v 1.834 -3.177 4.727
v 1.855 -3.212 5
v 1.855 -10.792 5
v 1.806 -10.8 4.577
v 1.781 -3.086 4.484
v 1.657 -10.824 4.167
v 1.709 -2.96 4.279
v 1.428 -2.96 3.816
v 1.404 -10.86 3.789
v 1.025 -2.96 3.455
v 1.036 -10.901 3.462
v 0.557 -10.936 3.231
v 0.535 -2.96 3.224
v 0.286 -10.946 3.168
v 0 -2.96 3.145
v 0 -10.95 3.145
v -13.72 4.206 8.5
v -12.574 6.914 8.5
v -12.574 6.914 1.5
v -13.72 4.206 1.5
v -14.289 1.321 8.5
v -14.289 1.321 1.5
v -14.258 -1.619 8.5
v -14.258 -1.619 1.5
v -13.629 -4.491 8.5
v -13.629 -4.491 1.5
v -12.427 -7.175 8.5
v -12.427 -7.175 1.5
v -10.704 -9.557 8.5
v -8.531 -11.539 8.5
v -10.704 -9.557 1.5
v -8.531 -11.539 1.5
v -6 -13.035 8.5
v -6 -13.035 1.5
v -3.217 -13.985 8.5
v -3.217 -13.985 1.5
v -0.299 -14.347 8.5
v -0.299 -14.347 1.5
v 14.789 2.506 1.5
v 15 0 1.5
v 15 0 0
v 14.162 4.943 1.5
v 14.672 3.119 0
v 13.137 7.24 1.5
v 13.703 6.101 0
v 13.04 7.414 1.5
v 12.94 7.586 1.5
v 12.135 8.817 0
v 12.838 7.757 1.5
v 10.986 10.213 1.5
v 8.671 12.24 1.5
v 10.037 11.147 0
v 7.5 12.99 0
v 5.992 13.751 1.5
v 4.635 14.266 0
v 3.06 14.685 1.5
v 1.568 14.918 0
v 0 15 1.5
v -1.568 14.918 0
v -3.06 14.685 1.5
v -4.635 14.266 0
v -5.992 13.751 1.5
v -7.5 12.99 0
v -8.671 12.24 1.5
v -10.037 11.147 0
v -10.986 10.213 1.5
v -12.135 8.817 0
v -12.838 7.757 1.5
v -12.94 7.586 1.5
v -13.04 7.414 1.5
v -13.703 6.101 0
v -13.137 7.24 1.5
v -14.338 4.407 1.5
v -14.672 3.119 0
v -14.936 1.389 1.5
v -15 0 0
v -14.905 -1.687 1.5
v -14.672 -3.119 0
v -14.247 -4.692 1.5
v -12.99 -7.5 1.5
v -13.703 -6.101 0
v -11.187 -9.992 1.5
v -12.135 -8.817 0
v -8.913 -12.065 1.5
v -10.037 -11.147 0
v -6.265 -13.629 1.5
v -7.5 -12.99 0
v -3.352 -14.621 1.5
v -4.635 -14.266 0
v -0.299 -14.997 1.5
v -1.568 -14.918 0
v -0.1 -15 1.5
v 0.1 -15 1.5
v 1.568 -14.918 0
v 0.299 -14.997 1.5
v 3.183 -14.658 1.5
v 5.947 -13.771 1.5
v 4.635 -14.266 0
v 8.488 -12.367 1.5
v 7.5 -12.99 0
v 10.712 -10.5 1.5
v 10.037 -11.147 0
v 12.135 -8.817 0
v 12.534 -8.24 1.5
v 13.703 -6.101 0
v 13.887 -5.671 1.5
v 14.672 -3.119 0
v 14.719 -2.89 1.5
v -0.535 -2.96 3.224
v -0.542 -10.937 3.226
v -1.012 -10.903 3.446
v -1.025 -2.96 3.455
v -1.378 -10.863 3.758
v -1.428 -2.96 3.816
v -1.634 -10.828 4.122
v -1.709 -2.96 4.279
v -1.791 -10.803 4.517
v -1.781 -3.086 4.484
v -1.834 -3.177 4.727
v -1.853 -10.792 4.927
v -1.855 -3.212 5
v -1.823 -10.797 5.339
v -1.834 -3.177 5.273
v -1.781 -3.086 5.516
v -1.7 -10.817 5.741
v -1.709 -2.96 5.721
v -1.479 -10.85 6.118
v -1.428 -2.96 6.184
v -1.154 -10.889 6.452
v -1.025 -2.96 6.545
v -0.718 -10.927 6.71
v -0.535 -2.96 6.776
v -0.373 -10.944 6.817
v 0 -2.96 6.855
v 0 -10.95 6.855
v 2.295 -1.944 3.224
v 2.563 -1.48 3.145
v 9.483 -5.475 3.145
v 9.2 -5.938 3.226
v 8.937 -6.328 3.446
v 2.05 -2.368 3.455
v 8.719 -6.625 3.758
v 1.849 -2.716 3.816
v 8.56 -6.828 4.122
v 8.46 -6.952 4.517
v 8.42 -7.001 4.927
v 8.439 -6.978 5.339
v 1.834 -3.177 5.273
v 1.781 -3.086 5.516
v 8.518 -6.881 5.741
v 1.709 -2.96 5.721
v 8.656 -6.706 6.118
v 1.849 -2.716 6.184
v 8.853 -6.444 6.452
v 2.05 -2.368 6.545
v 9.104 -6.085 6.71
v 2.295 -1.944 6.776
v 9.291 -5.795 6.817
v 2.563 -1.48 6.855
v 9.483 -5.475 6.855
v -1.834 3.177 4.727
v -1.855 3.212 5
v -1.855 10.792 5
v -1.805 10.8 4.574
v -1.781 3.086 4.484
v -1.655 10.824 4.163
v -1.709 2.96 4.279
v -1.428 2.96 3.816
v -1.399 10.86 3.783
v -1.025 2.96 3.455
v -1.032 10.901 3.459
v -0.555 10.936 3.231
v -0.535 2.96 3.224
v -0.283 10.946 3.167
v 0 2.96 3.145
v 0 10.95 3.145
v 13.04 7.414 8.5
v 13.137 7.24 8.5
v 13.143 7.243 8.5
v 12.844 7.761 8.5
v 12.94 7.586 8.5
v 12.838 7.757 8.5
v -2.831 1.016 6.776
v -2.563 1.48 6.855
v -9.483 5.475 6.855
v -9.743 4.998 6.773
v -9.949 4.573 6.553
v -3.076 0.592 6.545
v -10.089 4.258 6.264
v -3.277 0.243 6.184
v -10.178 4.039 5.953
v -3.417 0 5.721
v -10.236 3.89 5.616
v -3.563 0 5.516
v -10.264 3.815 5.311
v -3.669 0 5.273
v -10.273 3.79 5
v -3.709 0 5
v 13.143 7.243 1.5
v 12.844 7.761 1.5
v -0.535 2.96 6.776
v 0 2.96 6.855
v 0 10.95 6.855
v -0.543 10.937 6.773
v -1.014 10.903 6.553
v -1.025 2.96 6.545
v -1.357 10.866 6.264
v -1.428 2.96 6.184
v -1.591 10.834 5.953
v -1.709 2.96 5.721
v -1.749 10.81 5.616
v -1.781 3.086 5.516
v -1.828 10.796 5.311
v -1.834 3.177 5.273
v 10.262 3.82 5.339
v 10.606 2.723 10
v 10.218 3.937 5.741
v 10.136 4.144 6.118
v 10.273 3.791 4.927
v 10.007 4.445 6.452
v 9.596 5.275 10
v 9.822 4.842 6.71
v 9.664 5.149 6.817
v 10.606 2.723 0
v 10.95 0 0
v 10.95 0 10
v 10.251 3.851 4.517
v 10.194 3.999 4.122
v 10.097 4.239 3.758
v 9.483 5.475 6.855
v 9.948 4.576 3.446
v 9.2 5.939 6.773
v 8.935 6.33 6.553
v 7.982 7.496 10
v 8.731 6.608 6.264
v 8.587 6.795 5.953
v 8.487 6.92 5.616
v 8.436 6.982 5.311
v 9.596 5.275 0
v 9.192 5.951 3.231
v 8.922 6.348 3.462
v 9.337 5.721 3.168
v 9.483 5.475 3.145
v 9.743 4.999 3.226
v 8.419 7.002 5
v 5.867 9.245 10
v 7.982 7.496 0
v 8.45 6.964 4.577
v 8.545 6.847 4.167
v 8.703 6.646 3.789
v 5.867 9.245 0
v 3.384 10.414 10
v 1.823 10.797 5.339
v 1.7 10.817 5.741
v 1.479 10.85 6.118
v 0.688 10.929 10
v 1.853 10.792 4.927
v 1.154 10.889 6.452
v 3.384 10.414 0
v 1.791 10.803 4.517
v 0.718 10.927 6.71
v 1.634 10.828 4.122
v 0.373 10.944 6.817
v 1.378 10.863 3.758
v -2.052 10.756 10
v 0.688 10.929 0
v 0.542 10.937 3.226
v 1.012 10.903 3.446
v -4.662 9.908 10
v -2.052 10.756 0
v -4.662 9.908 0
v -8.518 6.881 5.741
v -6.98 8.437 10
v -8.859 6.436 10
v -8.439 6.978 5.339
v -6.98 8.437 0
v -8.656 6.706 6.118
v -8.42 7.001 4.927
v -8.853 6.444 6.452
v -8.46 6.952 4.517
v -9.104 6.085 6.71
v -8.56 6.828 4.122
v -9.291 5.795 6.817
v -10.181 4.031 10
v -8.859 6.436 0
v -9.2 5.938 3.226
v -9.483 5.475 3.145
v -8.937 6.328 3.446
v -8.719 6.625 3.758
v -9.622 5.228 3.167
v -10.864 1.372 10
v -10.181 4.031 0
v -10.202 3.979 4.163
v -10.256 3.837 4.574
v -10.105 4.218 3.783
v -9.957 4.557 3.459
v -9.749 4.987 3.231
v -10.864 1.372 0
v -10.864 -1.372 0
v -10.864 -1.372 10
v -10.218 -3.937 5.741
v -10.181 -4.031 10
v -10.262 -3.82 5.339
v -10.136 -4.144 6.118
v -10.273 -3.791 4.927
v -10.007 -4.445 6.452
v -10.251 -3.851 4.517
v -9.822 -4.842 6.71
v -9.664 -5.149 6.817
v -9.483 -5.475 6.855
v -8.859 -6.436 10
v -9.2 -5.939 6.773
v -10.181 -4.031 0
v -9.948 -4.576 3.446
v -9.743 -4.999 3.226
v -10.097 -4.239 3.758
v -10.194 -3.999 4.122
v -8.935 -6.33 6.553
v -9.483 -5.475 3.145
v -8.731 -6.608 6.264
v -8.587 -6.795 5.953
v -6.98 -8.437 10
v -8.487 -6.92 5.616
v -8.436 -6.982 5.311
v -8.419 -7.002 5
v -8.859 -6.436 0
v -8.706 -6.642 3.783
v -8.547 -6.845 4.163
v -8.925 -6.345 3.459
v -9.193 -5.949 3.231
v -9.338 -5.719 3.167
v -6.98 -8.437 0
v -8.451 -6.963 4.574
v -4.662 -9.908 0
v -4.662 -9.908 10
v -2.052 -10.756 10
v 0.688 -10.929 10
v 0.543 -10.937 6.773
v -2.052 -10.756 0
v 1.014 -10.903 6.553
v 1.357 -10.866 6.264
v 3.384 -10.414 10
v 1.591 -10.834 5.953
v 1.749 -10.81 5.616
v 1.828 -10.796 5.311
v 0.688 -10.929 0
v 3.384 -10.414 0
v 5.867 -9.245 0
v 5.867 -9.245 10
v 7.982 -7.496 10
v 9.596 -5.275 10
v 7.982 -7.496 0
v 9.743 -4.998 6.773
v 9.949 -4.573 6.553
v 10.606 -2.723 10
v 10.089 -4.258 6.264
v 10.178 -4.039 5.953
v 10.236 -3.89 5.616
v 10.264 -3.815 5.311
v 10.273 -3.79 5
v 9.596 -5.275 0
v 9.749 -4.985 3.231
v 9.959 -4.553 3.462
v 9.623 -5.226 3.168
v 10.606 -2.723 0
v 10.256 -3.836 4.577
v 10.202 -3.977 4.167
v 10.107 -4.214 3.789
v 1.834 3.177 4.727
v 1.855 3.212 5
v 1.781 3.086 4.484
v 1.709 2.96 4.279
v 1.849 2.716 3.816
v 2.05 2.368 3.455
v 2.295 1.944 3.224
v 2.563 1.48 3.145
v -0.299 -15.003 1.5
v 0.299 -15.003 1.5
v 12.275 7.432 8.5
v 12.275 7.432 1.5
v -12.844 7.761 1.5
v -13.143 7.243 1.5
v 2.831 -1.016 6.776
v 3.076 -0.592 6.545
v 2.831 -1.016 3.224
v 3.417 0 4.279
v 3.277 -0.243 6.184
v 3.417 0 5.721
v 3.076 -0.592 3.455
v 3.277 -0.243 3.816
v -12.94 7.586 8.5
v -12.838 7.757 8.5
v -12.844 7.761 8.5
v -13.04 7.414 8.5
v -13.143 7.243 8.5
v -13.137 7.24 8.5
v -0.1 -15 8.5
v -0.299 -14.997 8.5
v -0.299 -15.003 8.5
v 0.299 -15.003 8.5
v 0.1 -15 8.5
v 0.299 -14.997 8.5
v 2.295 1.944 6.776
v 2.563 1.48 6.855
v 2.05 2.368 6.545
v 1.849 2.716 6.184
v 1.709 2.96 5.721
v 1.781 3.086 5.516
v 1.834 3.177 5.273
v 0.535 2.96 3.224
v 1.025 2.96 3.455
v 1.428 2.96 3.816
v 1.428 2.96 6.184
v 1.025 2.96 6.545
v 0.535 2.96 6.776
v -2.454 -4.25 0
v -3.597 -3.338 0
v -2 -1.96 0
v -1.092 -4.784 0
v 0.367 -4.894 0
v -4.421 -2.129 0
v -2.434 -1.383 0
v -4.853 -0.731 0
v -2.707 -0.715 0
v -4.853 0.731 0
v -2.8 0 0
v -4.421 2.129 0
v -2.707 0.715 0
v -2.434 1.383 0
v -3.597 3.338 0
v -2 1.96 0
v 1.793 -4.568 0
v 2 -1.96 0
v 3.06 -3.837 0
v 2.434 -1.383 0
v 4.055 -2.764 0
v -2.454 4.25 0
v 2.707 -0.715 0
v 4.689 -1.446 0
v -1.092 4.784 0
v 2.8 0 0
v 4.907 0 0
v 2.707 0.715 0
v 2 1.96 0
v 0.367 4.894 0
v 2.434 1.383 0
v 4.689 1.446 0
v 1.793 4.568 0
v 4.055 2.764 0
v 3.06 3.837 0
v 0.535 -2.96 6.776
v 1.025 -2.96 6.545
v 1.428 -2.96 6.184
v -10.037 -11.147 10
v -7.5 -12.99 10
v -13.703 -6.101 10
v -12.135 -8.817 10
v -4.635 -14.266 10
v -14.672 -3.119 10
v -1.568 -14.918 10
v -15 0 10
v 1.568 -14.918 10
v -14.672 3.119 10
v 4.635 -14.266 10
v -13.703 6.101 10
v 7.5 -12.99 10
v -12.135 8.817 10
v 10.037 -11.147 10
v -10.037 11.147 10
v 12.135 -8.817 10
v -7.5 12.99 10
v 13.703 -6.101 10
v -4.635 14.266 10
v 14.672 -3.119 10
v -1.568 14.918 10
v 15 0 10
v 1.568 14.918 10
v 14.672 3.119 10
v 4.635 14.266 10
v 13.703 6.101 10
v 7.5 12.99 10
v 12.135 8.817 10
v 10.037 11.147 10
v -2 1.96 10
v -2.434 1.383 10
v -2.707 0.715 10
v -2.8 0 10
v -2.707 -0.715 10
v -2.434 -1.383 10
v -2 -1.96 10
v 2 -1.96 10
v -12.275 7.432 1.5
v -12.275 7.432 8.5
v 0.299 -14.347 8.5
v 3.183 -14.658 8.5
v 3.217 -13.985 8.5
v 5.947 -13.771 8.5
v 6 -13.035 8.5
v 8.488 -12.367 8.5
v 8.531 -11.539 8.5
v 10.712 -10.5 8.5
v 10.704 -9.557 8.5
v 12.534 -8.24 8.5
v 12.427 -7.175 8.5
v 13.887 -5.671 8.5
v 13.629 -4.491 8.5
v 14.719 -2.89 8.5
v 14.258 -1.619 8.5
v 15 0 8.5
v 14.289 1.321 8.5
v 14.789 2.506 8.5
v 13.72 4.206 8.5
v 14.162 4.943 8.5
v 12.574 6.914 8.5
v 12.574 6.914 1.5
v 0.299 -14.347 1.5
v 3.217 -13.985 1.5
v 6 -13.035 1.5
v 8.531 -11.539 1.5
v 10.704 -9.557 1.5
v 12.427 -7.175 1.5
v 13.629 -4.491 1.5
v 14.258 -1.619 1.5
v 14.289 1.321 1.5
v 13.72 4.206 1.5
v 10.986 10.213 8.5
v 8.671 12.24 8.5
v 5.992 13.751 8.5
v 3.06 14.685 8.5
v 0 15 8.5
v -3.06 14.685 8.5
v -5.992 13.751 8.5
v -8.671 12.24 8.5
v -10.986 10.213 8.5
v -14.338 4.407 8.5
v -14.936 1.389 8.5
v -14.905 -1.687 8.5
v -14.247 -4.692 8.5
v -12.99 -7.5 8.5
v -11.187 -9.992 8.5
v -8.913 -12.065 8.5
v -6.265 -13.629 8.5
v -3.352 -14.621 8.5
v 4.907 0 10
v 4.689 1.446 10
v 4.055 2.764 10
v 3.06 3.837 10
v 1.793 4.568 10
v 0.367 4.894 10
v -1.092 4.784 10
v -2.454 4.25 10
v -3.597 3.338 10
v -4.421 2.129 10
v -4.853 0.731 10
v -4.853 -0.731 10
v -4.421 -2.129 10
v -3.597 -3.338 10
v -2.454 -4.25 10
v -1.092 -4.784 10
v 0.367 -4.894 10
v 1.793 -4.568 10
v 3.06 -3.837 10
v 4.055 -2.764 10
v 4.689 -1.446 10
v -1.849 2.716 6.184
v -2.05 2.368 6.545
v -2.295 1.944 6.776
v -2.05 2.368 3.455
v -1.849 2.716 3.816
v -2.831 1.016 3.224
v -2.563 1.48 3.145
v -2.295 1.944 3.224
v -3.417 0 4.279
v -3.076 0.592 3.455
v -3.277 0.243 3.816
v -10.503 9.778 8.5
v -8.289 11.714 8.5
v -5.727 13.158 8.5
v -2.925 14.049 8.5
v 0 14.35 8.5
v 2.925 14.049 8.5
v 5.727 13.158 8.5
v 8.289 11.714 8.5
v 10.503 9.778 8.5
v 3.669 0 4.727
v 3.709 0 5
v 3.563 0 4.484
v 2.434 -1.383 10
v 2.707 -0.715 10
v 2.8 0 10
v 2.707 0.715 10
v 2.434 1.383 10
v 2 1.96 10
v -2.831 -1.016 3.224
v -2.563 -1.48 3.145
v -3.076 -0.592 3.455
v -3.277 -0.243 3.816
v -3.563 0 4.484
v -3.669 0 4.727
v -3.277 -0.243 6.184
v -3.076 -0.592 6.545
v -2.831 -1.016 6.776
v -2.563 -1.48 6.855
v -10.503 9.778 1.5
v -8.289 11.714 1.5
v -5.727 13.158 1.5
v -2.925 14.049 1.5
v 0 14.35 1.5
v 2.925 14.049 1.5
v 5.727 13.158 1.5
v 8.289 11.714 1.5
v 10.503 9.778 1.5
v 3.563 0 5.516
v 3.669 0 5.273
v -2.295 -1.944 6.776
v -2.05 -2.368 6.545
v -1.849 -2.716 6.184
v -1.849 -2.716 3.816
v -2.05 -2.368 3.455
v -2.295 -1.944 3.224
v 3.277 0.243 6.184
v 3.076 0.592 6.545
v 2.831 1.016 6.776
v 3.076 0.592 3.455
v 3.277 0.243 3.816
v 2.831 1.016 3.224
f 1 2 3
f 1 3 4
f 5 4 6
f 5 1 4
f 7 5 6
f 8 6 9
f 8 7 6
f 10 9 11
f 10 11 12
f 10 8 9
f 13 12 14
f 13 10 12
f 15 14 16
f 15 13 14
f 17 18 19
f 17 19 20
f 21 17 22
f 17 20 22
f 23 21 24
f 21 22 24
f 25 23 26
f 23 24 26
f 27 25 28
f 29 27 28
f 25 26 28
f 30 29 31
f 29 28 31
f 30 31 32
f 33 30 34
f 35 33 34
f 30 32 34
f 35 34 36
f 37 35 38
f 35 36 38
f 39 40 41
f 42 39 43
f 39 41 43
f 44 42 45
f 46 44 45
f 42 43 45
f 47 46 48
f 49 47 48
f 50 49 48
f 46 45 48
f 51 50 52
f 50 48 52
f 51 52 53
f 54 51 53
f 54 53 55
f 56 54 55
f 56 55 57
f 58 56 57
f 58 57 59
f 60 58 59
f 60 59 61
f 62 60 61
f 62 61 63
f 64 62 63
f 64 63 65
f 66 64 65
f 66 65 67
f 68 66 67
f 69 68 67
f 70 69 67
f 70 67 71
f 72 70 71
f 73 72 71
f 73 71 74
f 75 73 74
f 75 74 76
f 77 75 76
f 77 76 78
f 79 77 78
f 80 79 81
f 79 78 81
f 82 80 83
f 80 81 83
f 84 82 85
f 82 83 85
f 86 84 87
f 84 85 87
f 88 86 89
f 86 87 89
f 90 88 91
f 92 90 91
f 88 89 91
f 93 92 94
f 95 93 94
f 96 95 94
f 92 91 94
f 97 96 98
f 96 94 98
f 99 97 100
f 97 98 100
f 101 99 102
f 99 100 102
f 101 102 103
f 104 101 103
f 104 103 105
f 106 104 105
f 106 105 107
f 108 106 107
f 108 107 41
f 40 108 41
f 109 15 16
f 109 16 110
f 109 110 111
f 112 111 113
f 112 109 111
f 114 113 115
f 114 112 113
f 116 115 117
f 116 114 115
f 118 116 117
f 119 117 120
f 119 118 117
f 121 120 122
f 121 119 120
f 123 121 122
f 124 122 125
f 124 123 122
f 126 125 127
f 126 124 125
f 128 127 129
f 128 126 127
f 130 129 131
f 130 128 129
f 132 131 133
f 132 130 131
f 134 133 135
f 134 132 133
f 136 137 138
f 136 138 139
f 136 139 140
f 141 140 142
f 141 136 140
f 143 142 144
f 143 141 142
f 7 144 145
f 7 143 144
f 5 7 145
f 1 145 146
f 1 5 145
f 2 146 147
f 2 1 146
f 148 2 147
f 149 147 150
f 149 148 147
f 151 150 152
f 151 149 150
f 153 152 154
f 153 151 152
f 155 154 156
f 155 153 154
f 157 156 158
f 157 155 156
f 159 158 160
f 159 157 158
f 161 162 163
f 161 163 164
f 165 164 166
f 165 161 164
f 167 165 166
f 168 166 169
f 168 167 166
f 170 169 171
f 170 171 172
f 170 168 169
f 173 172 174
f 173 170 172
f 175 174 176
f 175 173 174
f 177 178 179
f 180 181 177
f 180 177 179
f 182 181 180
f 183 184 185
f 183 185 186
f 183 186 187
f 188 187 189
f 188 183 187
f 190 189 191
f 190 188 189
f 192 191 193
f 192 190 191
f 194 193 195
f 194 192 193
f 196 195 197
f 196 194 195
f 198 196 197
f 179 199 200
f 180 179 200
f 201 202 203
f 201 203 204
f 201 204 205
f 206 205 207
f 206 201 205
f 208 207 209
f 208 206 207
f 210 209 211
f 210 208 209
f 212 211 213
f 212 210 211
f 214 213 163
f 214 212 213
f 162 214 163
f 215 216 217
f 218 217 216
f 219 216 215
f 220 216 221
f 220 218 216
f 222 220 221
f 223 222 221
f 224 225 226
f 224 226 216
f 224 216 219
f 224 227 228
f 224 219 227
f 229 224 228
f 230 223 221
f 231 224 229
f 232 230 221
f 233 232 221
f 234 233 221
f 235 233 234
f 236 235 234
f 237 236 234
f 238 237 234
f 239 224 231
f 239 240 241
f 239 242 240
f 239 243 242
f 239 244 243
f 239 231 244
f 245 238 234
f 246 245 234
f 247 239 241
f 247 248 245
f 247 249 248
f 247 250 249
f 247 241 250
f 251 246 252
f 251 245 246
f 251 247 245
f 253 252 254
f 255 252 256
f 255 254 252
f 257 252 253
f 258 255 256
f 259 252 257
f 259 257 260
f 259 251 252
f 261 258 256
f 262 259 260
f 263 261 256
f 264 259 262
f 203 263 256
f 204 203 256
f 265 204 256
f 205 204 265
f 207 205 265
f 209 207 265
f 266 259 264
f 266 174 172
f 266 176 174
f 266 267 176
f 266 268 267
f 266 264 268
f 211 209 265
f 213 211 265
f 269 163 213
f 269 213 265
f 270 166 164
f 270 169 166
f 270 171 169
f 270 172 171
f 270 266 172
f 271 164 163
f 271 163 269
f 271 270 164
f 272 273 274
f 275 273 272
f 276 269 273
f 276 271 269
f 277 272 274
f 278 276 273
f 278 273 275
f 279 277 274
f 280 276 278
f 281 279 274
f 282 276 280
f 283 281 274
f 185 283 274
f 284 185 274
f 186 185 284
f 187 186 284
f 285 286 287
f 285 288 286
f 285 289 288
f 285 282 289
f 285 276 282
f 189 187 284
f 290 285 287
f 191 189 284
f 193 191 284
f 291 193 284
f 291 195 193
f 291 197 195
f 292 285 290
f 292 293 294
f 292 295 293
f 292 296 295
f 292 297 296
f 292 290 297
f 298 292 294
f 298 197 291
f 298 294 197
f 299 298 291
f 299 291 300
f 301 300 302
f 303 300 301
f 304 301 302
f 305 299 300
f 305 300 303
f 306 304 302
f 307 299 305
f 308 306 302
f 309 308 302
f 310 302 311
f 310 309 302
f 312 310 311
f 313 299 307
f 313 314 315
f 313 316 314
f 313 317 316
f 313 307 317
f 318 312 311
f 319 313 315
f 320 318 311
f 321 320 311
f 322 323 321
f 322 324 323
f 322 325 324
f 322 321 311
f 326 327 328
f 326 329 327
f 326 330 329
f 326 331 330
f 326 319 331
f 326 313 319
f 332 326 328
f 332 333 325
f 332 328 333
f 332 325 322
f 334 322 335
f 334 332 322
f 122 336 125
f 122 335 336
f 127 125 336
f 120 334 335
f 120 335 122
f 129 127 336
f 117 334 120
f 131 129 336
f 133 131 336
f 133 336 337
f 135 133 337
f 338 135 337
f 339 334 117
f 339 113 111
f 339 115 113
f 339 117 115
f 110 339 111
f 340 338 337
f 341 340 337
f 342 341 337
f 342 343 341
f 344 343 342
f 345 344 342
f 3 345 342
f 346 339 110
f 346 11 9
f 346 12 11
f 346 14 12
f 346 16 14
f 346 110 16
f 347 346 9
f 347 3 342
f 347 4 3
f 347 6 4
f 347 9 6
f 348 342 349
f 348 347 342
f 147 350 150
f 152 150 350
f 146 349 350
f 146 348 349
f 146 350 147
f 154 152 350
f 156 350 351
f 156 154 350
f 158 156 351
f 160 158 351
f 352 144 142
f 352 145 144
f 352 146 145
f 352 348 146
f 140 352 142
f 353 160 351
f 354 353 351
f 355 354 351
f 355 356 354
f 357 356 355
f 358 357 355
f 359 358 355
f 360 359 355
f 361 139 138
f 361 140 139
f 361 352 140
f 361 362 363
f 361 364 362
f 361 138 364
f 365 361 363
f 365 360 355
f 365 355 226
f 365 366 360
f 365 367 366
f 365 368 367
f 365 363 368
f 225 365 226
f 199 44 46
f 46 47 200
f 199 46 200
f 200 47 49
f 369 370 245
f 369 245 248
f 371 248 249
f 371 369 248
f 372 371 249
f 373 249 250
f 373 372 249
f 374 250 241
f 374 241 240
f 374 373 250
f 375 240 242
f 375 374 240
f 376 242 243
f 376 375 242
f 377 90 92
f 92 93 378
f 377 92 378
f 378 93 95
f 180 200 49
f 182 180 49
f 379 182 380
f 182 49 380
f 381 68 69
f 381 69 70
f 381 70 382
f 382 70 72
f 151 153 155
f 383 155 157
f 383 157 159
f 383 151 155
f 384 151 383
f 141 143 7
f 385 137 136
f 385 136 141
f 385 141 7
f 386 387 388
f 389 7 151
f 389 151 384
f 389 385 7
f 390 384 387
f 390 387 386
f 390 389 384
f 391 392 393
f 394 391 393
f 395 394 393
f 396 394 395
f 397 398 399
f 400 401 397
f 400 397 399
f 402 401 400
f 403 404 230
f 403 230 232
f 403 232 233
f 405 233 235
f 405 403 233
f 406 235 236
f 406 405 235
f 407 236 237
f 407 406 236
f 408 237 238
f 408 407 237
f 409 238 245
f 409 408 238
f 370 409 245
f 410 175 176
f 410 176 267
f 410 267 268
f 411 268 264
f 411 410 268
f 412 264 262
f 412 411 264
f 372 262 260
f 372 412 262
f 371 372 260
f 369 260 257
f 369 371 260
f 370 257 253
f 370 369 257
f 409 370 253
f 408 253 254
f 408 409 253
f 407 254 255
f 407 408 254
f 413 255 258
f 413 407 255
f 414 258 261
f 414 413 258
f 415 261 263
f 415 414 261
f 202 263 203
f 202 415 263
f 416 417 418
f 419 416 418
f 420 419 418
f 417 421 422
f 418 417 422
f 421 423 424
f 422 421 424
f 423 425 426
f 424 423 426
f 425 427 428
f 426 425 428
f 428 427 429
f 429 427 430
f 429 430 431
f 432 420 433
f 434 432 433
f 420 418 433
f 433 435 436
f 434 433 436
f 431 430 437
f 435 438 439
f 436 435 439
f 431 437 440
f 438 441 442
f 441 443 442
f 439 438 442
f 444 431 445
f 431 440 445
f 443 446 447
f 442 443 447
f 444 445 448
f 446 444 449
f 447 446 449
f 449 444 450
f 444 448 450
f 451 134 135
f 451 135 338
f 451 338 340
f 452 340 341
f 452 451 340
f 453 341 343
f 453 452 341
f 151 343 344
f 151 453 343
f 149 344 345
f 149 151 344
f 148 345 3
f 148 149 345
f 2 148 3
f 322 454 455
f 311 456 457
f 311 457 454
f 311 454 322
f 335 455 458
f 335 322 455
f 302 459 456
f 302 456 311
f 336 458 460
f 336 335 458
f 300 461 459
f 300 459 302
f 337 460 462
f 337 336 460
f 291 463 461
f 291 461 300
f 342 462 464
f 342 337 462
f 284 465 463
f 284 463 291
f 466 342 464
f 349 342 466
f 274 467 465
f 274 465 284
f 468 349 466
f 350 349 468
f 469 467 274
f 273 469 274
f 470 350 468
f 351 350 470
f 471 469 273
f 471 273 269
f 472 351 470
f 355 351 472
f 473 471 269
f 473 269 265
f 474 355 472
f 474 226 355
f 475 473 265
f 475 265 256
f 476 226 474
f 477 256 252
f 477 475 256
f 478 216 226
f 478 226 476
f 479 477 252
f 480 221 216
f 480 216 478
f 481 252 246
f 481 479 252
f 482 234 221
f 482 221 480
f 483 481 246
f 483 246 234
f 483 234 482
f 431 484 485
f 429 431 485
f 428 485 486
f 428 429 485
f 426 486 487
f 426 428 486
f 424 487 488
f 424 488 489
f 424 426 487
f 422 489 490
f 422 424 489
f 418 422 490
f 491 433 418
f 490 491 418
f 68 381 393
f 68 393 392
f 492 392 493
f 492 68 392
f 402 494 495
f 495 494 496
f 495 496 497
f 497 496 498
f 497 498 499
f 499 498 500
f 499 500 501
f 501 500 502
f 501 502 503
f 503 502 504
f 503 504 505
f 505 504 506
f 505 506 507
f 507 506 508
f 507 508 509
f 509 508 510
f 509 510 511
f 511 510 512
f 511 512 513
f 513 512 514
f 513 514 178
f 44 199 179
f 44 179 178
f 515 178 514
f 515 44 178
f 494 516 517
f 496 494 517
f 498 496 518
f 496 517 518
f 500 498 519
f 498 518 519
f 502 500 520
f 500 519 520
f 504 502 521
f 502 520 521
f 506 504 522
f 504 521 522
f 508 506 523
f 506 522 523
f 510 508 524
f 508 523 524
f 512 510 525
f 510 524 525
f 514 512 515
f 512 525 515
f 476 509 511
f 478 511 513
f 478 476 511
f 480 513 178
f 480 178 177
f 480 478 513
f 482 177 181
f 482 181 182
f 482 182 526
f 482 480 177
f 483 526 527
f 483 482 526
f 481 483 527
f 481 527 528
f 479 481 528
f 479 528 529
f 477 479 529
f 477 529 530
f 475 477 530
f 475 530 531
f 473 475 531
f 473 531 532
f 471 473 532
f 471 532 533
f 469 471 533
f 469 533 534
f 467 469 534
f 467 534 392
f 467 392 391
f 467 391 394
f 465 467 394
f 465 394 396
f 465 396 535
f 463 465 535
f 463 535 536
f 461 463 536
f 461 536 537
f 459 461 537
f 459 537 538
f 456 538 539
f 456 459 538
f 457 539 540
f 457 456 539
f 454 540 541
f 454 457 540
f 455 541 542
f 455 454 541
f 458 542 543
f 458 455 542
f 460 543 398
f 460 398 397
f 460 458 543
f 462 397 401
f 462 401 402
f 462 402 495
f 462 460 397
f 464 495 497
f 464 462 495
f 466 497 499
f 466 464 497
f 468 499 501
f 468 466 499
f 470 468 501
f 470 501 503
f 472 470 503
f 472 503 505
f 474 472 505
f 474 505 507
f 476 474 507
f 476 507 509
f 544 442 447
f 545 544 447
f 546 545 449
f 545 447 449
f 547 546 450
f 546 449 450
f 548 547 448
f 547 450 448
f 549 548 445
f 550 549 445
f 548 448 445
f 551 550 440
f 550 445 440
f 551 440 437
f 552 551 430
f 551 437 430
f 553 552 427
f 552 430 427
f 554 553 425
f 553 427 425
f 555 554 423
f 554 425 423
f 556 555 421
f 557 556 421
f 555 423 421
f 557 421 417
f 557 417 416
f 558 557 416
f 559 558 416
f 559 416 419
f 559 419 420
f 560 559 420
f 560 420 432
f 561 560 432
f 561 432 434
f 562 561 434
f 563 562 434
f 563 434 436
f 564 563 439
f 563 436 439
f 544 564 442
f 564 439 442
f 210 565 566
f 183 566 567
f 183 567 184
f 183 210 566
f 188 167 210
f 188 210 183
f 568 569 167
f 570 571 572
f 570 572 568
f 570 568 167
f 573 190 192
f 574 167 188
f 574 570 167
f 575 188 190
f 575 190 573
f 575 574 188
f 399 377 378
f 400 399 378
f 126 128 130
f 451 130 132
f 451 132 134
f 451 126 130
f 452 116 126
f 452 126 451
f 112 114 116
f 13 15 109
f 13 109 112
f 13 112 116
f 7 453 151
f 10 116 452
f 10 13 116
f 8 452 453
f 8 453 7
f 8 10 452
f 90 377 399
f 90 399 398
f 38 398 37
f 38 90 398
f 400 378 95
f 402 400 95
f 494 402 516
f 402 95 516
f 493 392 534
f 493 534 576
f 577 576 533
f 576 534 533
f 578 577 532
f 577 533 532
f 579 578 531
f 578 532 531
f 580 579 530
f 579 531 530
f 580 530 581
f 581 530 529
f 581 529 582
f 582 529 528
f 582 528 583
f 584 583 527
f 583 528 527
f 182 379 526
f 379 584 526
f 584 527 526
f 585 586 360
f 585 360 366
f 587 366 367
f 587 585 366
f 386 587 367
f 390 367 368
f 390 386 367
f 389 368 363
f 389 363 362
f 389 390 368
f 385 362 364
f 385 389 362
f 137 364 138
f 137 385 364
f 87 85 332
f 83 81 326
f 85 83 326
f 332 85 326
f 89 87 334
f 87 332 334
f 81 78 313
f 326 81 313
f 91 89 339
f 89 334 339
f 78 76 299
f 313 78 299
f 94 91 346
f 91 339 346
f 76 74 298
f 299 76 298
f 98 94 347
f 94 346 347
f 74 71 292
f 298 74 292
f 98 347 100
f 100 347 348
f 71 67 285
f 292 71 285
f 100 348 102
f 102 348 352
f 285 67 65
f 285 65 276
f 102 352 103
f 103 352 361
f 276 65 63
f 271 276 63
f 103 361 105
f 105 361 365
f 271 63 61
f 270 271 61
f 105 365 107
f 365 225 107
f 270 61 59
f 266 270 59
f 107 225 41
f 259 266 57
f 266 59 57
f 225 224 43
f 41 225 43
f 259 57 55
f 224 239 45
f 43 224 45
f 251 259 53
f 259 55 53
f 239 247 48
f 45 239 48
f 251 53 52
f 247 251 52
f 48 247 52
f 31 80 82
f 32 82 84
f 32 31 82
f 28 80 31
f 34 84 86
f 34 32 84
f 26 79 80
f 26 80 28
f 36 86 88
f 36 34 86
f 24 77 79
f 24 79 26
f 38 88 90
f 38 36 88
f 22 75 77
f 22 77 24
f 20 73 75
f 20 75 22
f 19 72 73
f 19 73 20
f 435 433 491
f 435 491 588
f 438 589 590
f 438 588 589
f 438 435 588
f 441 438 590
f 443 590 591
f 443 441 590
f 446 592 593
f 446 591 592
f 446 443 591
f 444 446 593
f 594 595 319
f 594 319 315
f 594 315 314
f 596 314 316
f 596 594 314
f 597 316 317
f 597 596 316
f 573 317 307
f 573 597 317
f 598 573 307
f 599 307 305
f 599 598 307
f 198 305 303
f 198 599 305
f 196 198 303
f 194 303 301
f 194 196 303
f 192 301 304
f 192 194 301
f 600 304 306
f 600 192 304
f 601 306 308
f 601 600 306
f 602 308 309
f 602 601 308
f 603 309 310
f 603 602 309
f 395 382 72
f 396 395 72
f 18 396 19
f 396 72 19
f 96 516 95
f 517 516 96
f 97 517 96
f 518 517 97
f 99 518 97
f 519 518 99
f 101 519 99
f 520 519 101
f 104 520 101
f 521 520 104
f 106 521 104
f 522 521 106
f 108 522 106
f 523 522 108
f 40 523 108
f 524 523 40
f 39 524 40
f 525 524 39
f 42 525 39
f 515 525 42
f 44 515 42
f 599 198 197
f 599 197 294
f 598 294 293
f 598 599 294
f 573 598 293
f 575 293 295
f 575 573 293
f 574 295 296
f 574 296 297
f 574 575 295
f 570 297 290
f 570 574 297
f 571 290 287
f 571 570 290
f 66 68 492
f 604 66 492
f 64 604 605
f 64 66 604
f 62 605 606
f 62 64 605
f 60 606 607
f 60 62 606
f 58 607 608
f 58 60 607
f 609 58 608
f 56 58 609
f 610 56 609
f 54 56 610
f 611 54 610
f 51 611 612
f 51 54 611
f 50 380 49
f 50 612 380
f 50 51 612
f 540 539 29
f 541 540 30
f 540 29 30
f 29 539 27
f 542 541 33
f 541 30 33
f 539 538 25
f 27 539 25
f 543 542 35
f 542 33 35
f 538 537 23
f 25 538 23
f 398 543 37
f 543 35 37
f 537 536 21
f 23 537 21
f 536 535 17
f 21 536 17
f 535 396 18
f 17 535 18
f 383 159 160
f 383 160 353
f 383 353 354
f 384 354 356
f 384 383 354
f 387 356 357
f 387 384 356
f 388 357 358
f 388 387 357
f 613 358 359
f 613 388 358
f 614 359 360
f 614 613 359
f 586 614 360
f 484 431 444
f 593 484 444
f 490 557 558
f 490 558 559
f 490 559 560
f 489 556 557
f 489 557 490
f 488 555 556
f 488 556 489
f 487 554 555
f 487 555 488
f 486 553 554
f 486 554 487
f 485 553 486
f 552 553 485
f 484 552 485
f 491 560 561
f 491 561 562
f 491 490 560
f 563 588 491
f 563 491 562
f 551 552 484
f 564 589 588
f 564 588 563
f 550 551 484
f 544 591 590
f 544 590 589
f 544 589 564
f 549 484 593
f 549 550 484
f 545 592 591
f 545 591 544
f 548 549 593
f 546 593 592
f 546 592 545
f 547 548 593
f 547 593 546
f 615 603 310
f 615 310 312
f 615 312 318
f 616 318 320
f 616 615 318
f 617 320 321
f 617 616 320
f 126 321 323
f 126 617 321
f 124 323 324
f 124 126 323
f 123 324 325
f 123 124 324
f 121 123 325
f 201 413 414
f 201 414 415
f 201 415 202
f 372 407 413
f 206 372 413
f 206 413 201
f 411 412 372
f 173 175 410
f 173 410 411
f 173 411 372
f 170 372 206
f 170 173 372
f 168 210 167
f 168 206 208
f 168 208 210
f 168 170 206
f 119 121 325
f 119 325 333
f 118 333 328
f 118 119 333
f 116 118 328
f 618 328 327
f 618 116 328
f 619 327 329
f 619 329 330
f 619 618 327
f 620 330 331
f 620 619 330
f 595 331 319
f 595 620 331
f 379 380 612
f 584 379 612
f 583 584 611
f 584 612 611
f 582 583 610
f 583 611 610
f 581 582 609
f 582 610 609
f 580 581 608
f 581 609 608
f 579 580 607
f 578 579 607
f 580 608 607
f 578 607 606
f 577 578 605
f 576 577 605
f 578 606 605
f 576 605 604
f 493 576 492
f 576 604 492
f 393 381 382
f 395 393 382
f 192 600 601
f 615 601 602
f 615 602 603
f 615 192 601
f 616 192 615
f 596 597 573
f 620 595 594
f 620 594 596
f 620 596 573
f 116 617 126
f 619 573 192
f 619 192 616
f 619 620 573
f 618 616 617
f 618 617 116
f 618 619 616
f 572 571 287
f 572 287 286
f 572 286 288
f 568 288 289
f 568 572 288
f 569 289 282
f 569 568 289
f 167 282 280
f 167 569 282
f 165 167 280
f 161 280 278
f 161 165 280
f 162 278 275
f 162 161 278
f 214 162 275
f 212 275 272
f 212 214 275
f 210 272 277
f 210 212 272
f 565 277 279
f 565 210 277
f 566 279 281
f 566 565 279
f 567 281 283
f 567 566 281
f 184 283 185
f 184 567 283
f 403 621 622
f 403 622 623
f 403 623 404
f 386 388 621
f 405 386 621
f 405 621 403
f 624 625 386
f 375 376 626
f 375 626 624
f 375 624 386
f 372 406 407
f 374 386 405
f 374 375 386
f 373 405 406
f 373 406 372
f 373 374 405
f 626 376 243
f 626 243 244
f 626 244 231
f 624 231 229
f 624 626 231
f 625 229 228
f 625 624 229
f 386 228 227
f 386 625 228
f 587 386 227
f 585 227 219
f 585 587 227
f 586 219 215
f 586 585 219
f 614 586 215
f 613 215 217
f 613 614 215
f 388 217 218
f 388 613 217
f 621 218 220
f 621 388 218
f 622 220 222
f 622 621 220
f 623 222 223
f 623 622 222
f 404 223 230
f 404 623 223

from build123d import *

# Parameters (mm, degrees)
SKETCH2_R           = 4.90735859
SKETCH2_R_2         = 2.8
BOSS_EXTRUDE1_DEPTH = 10
SKETCH3_R           = 14.35
SKETCH3_R_2         = 10.950119173
BOSS_EXTRUDE2_DEPTH = 10
SKETCH4_R           = 15
SKETCH4_R_2         = 14.35
BOSS_EXTRUDE3_DEPTH = 1.5
SKETCH5_R           = 15
SKETCH5_R_2         = 14.35
BOSS_EXTRUDE4_DEPTH = 1.5
BOSS_EXTRUDE5_DEPTH = 8.5
CIRPATTERN1_COUNT   = 6
SKETCH8_W           = 0.598057902
SKETCH8_H           = 0.656231918
BOSS_EXTRUDE6_DEPTH = 7
CIRPATTERN2_COUNT   = 3


with BuildPart() as part:
    # Sketch2 → Boss-Extrude1 (new body)
    # profile 1 of 3: a face of its own
    with BuildSketch(Plane.XY):
        Circle(SKETCH2_R)
        Circle(SKETCH2_R_2, mode=Mode.SUBTRACT)
    # profile 2 of 3: a face of its own
    with BuildSketch(Plane.XY):
        with BuildLine():
            Line((2, -1.959591794), (-2, -1.959591794))
            ThreePointArc((-2, -1.959591794), (0, -2.8), (2, -1.959591794))
        make_face()
    # profile 3 of 3: a face of its own
    with BuildSketch(Plane.XY):
        with BuildLine():
            Line((-2, 1.959591794), (2, 1.959591794))
            ThreePointArc((2, 1.959591794), (0, 2.8), (-2, 1.959591794))
        make_face()
    extrude(amount=BOSS_EXTRUDE1_DEPTH)


with BuildPart() as body_2:
    # Sketch3 → Boss-Extrude2 (new body)
    with BuildSketch(Plane.XY):
        Circle(SKETCH3_R)
        Circle(SKETCH3_R_2, mode=Mode.SUBTRACT)
    extrude(amount=BOSS_EXTRUDE2_DEPTH)

    # Sketch4 → Boss-Extrude3 (add)
    with BuildSketch(Plane.XY):
        Circle(SKETCH4_R)
        Circle(SKETCH4_R_2, mode=Mode.SUBTRACT)
    extrude(amount=BOSS_EXTRUDE3_DEPTH)

    # Sketch5 → Boss-Extrude4 (add)
    with BuildSketch(Plane.XY.offset(10)):
        Circle(SKETCH5_R)
        Circle(SKETCH5_R_2, mode=Mode.SUBTRACT)
    extrude(amount=-BOSS_EXTRUDE4_DEPTH)

    # Sketch7 → Boss-Extrude5 (add)
    with BuildSketch(Plane(origin=(0, 2.959591794, 0), x_dir=(-1, 0, 0), z_dir=(0, -1, 0))):
        with BuildLine():
            ThreePointArc((1.854596747, -5), (1.311397936, -3.688602064), (0, -3.145403253))
            Line((0, -3.145403253), (0, -6.854596747))
            ThreePointArc((0, -6.854596747), (1.311397936, -6.311397936), (1.854596747, -5))
        make_face()
        with BuildLine():
            Line((0, -6.854596747), (0, -3.145403253))
            ThreePointArc((0, -3.145403253), (-1.854596747, -5), (0, -6.854596747))
        make_face()
    boss_extrude5 = extrude(amount=-BOSS_EXTRUDE5_DEPTH)

    # CirPattern1: Boss-Extrude5 ×6 about axis
    cirpattern1_axis = Axis((0, 0, 10), (0, 0, 1))
    for i in range(1, CIRPATTERN1_COUNT):
        add(boss_extrude5.rotate(cirpattern1_axis, i * 360 / CIRPATTERN1_COUNT))

    # Sketch8 → Boss-Extrude6 (add)
    with BuildSketch(Plane.XY.offset(1.5)):
        with Locations((0, -14.675)):
            Rectangle(SKETCH8_W, SKETCH8_H)
    boss_extrude6 = extrude(amount=BOSS_EXTRUDE6_DEPTH)

    # CirPattern2: Boss-Extrude6 ×3 about axis
    cirpattern2_axis = Axis((0, 0, 0), (0, 0, 1))
    for i in range(1, CIRPATTERN2_COUNT):
        add(boss_extrude6.rotate(cirpattern2_axis, i * 360 / CIRPATTERN2_COUNT))


solid = Compound([part.part, body_2.part])
